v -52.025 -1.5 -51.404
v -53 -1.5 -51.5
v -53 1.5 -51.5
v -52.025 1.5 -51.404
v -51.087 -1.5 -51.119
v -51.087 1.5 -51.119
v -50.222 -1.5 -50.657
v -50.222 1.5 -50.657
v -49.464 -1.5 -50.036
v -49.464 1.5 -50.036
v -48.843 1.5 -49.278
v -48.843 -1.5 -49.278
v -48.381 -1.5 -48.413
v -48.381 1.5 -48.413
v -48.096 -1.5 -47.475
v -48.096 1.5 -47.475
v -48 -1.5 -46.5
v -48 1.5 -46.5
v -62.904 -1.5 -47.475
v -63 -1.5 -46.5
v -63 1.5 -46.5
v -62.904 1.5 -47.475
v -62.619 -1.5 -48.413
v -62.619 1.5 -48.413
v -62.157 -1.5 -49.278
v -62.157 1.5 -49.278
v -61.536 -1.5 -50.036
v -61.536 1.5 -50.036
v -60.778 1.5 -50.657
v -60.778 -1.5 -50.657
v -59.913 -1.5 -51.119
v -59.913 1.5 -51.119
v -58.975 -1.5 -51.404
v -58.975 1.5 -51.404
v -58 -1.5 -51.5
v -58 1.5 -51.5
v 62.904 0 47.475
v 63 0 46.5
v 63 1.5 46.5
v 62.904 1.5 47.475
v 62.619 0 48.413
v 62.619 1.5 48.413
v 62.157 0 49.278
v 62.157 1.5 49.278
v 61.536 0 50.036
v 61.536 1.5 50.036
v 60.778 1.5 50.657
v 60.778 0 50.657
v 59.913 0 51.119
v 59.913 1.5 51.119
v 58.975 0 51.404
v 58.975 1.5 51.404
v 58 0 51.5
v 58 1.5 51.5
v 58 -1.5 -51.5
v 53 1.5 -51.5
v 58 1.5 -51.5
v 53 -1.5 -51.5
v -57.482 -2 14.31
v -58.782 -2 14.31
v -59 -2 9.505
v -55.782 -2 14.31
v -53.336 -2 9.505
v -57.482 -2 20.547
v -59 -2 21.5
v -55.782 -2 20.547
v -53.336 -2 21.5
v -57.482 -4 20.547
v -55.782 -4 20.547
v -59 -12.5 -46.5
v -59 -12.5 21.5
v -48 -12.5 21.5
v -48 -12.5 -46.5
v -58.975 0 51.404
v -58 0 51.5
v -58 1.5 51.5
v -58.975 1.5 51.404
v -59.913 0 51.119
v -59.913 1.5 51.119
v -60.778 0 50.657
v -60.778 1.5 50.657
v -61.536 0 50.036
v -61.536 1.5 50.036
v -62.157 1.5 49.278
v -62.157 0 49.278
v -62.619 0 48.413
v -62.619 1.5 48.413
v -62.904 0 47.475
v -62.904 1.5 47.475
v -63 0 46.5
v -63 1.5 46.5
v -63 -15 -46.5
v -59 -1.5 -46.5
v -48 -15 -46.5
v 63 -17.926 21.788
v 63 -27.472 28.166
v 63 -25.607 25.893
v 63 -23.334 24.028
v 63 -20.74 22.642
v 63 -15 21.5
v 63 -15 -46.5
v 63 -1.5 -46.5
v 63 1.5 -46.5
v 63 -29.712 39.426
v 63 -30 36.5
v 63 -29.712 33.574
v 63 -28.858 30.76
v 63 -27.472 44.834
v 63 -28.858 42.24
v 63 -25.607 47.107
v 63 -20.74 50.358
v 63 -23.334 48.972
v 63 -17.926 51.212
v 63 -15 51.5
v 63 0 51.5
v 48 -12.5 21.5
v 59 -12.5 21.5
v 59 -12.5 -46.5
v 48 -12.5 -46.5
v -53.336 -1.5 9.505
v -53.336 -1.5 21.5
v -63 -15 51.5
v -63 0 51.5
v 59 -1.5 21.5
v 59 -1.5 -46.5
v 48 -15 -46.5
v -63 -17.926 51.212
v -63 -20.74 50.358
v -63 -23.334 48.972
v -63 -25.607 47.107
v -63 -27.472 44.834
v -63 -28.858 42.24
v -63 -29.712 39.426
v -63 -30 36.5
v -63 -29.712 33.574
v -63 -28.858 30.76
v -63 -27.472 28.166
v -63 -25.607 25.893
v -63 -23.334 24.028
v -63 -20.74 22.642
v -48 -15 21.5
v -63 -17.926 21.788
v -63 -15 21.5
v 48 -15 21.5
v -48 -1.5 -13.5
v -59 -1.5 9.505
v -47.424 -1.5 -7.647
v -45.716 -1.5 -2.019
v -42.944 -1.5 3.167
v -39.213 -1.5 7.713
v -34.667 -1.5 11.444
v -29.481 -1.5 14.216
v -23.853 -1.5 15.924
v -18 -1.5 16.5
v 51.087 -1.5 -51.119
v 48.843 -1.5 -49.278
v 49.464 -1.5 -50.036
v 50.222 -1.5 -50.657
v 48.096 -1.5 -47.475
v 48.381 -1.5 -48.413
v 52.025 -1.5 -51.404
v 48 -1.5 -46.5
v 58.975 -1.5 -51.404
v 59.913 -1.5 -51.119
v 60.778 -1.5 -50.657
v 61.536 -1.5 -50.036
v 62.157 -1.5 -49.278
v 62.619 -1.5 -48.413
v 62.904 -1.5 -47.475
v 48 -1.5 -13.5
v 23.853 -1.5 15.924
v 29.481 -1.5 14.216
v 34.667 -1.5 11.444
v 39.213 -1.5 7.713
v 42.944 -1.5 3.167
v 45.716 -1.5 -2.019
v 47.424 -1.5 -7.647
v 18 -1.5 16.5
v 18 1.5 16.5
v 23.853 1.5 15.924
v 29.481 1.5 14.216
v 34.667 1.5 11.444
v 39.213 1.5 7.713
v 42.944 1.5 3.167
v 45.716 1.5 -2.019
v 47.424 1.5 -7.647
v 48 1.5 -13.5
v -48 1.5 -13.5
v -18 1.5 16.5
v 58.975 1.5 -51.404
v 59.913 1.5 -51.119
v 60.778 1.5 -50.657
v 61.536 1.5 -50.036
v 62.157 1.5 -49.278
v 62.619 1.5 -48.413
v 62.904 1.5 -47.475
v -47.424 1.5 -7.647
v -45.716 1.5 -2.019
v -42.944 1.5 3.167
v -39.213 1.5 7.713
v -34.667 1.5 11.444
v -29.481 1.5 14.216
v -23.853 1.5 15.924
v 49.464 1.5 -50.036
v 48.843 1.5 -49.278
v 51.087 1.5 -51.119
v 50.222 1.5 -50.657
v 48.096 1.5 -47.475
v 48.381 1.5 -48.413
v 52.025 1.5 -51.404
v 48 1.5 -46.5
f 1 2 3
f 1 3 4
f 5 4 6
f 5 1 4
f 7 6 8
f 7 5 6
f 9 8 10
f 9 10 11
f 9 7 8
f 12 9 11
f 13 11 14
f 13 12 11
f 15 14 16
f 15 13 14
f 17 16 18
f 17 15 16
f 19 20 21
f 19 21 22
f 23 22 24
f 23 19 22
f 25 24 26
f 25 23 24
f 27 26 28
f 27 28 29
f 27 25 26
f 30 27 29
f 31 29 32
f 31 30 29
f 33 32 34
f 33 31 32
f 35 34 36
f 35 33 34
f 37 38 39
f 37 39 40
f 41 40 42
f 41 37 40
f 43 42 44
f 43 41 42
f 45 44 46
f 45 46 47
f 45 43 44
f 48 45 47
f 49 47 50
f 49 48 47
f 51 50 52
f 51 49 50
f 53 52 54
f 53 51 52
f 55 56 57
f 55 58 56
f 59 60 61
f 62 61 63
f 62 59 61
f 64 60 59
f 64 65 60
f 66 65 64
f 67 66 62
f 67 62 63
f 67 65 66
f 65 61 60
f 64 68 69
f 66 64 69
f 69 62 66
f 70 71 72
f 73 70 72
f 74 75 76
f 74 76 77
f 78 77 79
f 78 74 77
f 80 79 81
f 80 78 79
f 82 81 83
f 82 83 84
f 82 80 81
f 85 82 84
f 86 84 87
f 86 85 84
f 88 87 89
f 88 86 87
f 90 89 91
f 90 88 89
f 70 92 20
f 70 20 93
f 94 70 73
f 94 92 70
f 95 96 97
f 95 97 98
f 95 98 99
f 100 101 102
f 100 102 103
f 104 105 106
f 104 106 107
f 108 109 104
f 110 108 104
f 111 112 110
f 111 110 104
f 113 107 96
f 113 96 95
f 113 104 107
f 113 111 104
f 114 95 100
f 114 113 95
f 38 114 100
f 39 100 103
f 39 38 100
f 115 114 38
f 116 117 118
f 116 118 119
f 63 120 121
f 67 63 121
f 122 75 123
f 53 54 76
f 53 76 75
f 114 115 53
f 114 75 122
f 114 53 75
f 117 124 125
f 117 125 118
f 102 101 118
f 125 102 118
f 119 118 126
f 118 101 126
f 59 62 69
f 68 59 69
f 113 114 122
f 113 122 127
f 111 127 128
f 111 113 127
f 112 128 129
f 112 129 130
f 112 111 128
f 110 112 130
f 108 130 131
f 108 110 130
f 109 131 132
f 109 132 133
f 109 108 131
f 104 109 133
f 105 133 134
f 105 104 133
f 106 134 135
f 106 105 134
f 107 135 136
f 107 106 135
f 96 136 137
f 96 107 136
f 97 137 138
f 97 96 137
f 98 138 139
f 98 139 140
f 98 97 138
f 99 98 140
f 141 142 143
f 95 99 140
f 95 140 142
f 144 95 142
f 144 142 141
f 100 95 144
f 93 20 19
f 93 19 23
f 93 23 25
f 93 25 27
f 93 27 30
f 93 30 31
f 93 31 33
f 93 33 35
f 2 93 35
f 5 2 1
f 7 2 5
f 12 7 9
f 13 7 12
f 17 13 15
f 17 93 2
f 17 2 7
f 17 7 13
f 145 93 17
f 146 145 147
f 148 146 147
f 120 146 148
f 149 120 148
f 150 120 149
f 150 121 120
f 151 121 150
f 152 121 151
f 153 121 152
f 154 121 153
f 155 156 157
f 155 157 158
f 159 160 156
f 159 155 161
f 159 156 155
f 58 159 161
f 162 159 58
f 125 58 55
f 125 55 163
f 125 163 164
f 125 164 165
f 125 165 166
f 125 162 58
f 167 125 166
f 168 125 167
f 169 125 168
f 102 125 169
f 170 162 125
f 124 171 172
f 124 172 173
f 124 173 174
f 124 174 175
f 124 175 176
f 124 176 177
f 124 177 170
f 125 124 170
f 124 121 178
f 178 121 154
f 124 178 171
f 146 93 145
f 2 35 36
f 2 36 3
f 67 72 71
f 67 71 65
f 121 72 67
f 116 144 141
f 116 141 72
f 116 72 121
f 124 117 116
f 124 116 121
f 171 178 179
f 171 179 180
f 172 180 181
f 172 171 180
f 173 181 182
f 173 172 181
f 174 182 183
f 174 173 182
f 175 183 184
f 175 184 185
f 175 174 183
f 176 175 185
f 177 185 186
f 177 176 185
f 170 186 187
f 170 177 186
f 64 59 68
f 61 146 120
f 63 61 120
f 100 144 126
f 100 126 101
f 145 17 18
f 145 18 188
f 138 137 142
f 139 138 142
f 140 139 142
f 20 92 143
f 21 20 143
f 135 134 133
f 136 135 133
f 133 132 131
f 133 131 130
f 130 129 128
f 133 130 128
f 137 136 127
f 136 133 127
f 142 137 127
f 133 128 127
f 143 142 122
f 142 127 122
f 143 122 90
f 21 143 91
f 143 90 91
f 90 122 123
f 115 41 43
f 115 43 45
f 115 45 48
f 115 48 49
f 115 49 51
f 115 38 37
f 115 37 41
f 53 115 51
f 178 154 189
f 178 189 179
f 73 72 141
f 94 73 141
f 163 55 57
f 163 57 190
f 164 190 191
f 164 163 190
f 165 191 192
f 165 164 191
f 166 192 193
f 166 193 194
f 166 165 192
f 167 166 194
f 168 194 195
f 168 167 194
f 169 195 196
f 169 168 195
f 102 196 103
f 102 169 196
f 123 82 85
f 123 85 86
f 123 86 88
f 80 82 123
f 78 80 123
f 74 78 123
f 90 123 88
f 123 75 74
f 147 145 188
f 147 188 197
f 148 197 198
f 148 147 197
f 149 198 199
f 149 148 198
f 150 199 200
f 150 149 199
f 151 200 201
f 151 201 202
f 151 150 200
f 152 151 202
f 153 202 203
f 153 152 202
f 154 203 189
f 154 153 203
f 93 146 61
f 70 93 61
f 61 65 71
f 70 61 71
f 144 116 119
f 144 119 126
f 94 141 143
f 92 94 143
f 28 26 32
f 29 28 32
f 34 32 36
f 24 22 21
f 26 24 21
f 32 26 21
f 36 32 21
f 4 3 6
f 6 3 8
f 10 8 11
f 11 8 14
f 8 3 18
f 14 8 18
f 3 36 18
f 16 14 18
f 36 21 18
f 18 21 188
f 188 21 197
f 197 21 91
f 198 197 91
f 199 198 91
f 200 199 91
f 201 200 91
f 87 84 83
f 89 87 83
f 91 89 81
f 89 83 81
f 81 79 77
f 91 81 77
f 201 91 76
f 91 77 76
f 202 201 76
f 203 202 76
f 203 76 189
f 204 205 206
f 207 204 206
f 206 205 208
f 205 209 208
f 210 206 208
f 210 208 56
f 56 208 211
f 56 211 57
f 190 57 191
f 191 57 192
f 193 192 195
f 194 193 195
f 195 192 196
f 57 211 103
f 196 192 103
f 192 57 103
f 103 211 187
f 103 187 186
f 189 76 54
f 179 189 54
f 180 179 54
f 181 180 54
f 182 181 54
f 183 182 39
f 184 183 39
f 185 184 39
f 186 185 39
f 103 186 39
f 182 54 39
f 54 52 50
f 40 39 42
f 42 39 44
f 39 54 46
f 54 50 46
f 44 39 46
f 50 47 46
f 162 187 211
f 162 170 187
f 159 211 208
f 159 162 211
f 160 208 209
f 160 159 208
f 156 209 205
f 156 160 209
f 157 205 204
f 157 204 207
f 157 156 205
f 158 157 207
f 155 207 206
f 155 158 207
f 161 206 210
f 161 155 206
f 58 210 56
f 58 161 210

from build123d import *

# Parameters (mm, degrees)
F1_DEPTH  = 1.5
F3_DEPTH  = 63
F6_DEPTH  = 68
F8_W      = 5.6641247272
F8_H      = 11.9948398471
F9_DEPTH  = 0.5
F10_W     = 1.7004162073
F10_H     = 6.2374770641
F11_DEPTH = 2
F13_DEPTH = 3


with BuildPart() as f1:
    # F0 (on Front) → F1 (new body, symmetric)
    with BuildSketch(Plane.XZ):
        with BuildLine():
            Line((53, -51.5), (58, -51.5))
            ThreePointArc((58, -51.5), (61.5355339059, -50.0355339059), (63, -46.5))
            Line((63, -46.5), (63, 46.5))
            ThreePointArc((63, 46.5), (61.5355339059, 50.0355339059), (58, 51.5))
            Line((58, 51.5), (-58, 51.5))
            ThreePointArc((-58, 51.5), (-61.5355339059, 50.0355339059), (-63, 46.5))
            Line((-63, 46.5), (-63, -46.5))
            ThreePointArc((-63, -46.5), (-61.5355339059, -50.0355339059), (-58, -51.5))
            Line((-58, -51.5), (-53, -51.5))
            ThreePointArc((-53, -51.5), (-49.4644660941, -50.0355339059), (-48, -46.5))
            Line((-48, -46.5), (-48, -13.5))
            ThreePointArc((-48, -13.5), (-39.2132034356, 7.7132034356), (-18, 16.5))
            Line((-18, 16.5), (18, 16.5))
            ThreePointArc((18, 16.5), (39.2132034356, 7.7132034356), (48, -13.5))
            Line((48, -13.5), (48, -46.5))
            ThreePointArc((48, -46.5), (49.4644660941, -50.0355339059), (53, -51.5))
        make_face()
    extrude(amount=F1_DEPTH, both=True)

    # F2 (on Right) → F3 (join, symmetric)
    with BuildSketch(Plane.YZ):
        with BuildLine():
            Line((0, 21.5), (0, 51.5))
            Line((0, 51.5), (-15, 51.5))
            ThreePointArc((-15, 51.5), (-25.6066017178, 47.1066017178), (-30, 36.5))
            ThreePointArc((-30, 36.5), (-25.6066017178, 25.8933982822), (-15, 21.5))
            Line((-15, 21.5), (0, 21.5))
        make_face()
    extrude(amount=F3_DEPTH, both=True)

    # F5 (on face) → F6 (join)
    with BuildSketch(Plane(origin=(0, 0, 21.5), x_dir=(1, 0, 0), z_dir=(0, 0, -1))):
        Polygon((-48, 15), (-63, 15), (-63, 1.5), (-59, 1.5), (-59, 12.5), (-48, 12.5), align=None)
    extrude(amount=F6_DEPTH)

    # F7: F1 across plane


with BuildPart() as f1_1:
    add(f1.part)
    add(f1.part.mirror(Plane.YZ))

    # F8 (on face) → F9 (join)
    with BuildSketch(Plane.XZ.offset(1.5)):
        with Locations((-56.1679376364, 15.5025800765)):
            Rectangle(F8_W, F8_H)
    extrude(amount=F9_DEPTH)

    # F10 (on face) → F11 (join)
    with BuildSketch(Plane.XZ.offset(2)):
        with Locations((-56.6318407655, 17.4285247922)):
            Rectangle(F10_W, F10_H)
    extrude(amount=F11_DEPTH)

    # F12 (on face) → F13 (cut)
    with BuildSketch(Plane.YZ.offset(-55.7816326618)):
        Polygon((-2, 14.3097862601), (-4, 20.5472633243), (-4, 14.3097862601), align=None)
    extrude(amount=-F13_DEPTH, mode=Mode.SUBTRACT)


solid = f1_1.part
